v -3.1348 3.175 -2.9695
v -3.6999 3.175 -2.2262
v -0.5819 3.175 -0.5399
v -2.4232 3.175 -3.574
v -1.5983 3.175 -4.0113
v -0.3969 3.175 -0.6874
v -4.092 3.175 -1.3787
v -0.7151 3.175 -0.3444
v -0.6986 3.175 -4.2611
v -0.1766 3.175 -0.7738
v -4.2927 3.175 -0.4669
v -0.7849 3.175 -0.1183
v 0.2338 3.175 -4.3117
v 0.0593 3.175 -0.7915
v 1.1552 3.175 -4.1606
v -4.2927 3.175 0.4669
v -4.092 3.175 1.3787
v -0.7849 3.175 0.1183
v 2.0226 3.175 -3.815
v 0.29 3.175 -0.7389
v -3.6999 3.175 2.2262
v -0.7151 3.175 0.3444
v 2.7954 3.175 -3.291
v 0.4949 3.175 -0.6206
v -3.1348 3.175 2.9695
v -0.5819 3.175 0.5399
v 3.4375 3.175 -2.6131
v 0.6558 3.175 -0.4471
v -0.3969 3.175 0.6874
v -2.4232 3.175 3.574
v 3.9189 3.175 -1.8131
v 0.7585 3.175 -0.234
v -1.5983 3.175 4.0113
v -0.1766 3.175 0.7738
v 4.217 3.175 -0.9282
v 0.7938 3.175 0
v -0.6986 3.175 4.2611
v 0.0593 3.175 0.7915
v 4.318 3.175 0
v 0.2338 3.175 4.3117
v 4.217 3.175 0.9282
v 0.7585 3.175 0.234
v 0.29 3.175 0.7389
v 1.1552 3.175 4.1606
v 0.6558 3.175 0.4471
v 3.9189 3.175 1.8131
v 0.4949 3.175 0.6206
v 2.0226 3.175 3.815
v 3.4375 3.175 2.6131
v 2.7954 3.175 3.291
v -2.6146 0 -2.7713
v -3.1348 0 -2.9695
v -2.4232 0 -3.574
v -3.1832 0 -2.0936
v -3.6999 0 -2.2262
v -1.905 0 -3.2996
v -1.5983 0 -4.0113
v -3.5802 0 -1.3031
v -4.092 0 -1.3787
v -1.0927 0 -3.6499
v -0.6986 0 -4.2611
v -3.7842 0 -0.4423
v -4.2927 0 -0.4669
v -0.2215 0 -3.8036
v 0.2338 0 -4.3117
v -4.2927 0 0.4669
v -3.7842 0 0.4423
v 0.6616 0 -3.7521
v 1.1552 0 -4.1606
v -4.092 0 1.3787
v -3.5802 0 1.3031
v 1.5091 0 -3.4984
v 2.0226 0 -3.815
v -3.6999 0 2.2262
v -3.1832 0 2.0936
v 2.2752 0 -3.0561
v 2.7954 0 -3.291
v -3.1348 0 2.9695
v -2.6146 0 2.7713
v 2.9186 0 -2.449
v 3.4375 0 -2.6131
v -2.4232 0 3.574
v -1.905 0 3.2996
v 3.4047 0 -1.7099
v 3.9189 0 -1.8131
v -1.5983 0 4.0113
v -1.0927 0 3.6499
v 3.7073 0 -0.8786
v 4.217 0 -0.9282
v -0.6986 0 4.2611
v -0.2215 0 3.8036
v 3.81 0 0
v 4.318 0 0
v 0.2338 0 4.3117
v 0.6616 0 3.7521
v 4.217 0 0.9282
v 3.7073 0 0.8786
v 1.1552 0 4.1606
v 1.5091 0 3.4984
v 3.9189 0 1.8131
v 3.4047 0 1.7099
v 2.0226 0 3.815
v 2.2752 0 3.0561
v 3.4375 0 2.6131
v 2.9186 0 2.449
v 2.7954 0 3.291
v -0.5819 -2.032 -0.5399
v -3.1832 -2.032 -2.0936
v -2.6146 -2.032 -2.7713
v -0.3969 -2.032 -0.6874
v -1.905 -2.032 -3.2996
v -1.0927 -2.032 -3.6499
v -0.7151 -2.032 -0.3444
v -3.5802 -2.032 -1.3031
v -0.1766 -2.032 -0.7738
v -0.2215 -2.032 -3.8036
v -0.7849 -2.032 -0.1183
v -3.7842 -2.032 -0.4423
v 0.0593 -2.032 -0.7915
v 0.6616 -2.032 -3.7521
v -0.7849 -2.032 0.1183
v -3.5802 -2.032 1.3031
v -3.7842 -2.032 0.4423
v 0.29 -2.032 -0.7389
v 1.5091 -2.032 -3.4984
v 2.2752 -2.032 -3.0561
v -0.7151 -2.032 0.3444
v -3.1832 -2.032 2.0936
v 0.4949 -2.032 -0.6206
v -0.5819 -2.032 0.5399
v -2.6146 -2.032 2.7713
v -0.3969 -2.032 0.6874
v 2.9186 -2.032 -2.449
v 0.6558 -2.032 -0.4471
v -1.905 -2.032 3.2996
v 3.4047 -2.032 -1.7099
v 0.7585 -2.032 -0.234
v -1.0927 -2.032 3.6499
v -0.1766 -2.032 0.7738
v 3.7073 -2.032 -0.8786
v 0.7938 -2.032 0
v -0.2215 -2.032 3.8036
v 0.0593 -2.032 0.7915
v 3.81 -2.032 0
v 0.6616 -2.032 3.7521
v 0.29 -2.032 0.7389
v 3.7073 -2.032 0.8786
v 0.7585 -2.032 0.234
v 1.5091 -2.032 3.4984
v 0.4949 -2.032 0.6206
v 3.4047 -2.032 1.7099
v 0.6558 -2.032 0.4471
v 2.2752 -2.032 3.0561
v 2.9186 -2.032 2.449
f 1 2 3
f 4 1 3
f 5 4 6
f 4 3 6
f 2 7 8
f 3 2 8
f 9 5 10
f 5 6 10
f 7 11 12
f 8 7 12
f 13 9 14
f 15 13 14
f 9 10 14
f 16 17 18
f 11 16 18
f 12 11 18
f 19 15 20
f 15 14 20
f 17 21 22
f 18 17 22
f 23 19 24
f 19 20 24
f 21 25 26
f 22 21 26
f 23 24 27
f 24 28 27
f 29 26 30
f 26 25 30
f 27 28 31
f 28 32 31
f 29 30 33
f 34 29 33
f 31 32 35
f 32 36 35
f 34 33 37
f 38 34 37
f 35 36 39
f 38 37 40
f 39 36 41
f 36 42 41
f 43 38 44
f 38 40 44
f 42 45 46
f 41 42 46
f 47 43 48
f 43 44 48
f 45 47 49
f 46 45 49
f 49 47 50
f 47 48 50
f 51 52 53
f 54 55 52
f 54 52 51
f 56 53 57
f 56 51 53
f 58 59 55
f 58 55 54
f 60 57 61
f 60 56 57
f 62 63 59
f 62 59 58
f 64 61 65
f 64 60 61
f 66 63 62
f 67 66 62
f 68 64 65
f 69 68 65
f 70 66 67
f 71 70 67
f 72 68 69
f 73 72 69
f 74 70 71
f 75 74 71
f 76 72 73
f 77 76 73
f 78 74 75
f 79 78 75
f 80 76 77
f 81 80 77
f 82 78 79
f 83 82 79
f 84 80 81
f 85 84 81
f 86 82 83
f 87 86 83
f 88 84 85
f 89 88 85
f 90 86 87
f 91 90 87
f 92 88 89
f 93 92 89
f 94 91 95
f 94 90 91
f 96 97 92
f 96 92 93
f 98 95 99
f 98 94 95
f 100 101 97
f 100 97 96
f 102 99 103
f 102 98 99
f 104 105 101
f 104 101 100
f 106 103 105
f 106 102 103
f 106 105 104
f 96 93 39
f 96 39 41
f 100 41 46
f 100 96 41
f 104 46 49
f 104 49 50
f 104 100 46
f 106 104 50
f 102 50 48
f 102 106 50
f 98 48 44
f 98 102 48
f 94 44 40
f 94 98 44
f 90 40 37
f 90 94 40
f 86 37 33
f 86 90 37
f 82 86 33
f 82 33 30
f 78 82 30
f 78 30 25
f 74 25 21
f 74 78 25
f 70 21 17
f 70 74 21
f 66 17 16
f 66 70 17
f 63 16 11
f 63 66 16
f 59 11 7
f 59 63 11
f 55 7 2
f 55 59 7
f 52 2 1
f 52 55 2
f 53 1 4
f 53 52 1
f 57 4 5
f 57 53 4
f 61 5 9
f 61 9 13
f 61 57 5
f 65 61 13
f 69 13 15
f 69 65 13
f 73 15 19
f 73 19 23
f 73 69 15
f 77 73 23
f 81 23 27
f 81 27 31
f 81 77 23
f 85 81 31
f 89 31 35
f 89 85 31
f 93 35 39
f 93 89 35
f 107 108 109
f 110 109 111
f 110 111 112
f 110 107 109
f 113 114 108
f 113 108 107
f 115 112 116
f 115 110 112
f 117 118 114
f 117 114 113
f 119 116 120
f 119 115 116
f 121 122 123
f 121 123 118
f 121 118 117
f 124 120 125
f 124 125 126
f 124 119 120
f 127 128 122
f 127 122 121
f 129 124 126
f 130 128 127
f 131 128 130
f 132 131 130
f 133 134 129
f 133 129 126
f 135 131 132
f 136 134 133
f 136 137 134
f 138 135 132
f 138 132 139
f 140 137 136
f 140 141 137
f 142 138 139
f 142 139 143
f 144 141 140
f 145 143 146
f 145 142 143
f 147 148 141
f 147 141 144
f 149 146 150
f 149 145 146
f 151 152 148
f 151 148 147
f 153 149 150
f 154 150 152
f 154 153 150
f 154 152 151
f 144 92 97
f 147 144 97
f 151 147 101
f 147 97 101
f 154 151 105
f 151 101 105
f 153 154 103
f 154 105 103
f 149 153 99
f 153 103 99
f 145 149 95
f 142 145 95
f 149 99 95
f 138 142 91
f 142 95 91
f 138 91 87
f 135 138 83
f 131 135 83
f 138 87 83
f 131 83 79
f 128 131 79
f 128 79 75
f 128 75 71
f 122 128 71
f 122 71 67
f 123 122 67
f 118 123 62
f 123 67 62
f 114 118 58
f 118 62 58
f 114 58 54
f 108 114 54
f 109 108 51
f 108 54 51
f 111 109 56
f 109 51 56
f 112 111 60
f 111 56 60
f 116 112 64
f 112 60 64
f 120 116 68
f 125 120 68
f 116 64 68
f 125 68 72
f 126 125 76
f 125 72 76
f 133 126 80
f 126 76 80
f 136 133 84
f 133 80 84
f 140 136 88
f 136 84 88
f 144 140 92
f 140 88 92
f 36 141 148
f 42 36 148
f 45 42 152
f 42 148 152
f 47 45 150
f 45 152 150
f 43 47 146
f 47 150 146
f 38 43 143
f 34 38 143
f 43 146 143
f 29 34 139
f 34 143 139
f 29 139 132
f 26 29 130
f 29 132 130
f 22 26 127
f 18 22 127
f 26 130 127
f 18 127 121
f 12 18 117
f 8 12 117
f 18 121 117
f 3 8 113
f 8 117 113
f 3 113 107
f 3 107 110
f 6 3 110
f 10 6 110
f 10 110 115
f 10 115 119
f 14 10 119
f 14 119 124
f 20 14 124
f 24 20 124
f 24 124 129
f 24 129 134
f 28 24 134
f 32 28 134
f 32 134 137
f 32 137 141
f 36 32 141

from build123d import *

# Parameters (mm, degrees)
F0_R     = 4.318
F1_DEPTH = 3.175
F2_R     = 3.81
F3_DEPTH = 2.032
F4_R     = 0.79375
F5_DEPTH = 5.208


with BuildPart() as f1:
    # F0 (on Front) → F1 (new body)
    with BuildSketch(Plane.XZ):
        Circle(F0_R)
    extrude(amount=-F1_DEPTH)

    # F2 (on face) → F3 (join)
    with BuildSketch(Plane.XZ):
        Circle(F2_R)
    extrude(amount=F3_DEPTH)

    # F4 (on face) → F5 (cut, through all)
    with BuildSketch(Plane.XZ.offset(2.032)):
        Circle(F4_R)
    extrude(amount=-F5_DEPTH, mode=Mode.SUBTRACT)


solid = f1.part
